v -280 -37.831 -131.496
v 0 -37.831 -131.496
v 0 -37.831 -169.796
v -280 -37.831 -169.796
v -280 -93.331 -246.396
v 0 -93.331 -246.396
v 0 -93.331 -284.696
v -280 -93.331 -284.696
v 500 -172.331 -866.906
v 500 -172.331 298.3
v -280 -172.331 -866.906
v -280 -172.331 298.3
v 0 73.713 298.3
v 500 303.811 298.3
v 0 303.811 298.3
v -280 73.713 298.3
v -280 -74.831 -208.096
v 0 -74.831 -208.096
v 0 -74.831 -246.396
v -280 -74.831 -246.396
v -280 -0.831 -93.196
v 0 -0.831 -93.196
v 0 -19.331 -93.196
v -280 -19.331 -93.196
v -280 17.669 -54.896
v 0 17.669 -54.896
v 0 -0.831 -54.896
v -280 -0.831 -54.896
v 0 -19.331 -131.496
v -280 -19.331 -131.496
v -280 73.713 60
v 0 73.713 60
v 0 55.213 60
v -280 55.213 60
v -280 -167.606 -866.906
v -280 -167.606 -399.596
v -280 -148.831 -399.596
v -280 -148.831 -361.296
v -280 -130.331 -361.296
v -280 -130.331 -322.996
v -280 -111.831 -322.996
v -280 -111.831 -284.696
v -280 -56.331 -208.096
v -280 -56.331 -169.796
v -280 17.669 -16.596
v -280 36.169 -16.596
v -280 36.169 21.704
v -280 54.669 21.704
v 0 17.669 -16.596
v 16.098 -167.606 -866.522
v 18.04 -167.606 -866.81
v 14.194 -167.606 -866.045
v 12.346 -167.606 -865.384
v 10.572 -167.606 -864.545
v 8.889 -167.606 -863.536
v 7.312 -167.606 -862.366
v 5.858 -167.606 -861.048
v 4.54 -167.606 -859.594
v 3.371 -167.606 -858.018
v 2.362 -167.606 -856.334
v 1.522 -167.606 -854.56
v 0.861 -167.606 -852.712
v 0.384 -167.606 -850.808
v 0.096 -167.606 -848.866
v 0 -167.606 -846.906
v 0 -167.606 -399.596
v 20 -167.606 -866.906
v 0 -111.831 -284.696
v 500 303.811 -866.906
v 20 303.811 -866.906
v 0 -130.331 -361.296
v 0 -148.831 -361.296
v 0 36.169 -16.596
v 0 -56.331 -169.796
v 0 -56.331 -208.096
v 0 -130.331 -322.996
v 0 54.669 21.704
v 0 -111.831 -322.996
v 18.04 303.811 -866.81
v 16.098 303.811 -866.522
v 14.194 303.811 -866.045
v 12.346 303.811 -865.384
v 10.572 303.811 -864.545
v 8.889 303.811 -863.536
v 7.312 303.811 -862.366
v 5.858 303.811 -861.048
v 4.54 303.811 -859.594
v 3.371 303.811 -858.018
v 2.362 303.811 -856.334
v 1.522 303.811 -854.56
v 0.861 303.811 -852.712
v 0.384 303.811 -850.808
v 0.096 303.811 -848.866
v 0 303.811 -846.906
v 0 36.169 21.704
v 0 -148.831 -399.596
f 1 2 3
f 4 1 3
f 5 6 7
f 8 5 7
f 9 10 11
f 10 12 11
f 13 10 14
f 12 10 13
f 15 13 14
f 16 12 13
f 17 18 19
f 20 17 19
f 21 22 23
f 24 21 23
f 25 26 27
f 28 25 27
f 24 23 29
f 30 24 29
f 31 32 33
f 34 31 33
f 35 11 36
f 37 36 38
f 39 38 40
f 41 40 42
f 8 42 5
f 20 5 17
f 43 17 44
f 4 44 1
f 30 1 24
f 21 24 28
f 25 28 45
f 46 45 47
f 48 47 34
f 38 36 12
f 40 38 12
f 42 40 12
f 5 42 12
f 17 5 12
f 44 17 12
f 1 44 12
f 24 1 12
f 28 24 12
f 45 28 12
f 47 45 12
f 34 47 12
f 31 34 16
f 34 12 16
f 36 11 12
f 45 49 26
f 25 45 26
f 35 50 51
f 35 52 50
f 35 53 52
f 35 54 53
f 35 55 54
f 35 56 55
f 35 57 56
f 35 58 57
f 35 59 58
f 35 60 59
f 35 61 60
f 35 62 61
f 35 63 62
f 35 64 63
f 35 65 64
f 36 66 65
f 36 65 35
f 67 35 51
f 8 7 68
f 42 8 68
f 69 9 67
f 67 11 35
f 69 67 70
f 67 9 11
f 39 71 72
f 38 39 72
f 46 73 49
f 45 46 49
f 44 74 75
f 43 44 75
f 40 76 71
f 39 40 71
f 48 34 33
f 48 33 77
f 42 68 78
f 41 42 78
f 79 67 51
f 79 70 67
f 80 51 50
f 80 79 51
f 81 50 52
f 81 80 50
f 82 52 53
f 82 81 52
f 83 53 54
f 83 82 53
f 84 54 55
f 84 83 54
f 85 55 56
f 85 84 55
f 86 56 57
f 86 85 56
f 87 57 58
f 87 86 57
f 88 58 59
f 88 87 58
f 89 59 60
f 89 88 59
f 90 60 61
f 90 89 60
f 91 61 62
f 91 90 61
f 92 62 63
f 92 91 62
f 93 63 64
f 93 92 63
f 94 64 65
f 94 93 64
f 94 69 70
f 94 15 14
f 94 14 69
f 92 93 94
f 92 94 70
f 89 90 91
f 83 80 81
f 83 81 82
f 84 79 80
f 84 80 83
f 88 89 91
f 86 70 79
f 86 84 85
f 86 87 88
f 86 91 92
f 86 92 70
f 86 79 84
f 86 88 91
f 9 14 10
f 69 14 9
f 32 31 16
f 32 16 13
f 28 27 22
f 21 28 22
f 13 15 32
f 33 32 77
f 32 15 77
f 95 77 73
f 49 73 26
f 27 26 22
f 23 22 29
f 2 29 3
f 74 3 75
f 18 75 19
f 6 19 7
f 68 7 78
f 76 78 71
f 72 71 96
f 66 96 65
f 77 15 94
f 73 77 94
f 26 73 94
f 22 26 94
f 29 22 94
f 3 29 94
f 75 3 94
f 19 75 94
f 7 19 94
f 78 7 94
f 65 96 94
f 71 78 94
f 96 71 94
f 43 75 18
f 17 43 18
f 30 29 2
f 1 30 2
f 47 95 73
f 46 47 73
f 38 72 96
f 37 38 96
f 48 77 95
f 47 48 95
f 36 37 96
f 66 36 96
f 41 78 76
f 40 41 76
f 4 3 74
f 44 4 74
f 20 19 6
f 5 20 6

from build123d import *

# Parameters (mm, degrees)
BOSS_EXTRUDE1_DEPTH = 280
SKETCH2_W           = 280
SKETCH2_H           = 5
BOSS_EXTRUDE2_DEPTH = 497.896133892
SKETCH3_W           = 280
SKETCH3_H           = 246.044177264
BOSS_EXTRUDE3_DEPTH = 200
SKETCH4_W           = 280
SKETCH4_H           = 4.725360331
BOSS_EXTRUDE4_DEPTH = 467.31
SKETCH5_W           = 1165.206133892
SKETCH5_H           = 476.142057012
BOSS_EXTRUDE5_DEPTH = 500
FILLET1_R           = 20


with BuildPart() as part:
    # Sketch1 → Boss-Extrude1 (new body)
    with BuildSketch(Plane(origin=(0, 0, 0), x_dir=(0, 0, -1), z_dir=(1, 0, 0))):
        Polygon((-98.3, 73.71314577), (-60, 73.71314577), (-60, 55.21314577), (-21.703866108, 54.668968506), (-21.703866108, 36.168968506), (16.596133892, 36.168968506), (16.596133892, 17.668968506), (54.896133892, 17.668968506), (54.896133892, -0.831031494), (93.196133892, -0.831031494), (93.196133892, -19.331031494), (131.496133892, -19.331031494), (131.496133892, -37.831031494), (169.796133892, -37.831031494), (169.796133892, -56.331031494), (208.096133892, -56.331031494), (208.096133892, -74.831031494), (246.396133892, -74.831031494), (246.396133892, -93.331031494), (284.696133892, -93.331031494), (284.696133892, -111.831031494), (322.996133892, -111.831031494), (322.996133892, -130.331031494), (361.296133892, -130.331031494), (361.296133892, -148.831031494), (399.596133892, -148.831031494), (399.596133892, -167.331031494), (-98.3, -167.331031494), align=None)
    extrude(amount=-BOSS_EXTRUDE1_DEPTH)

    # Sketch2 → Boss-Extrude2 (add)
    with BuildSketch(Plane.XY.offset(98.3)):
        with Locations((-140, -169.831031494)):
            Rectangle(SKETCH2_W, SKETCH2_H)
    extrude(amount=-BOSS_EXTRUDE2_DEPTH)

    # Sketch3 → Boss-Extrude3 (add)
    with BuildSketch(Plane.XY.offset(98.3)):
        with Locations((-140, -49.308942862)):
            Rectangle(SKETCH3_W, SKETCH3_H)
    extrude(amount=BOSS_EXTRUDE3_DEPTH)

    # Sketch4 → Boss-Extrude4 (add)
    with BuildSketch(Plane(origin=(0, 0, -399.596133892), x_dir=(-1, 0, 0), z_dir=(0, 0, -1))):
        with Locations((140, -169.968351329)):
            Rectangle(SKETCH4_W, SKETCH4_H)
    extrude(amount=BOSS_EXTRUDE4_DEPTH)

    # Sketch5 → Boss-Extrude5 (add)
    with BuildSketch(Plane(origin=(0, 0, 0), x_dir=(0, 0, -1), z_dir=(1, 0, 0))):
        with Locations((284.303066946, 65.739997012)):
            Rectangle(SKETCH5_W, SKETCH5_H)
    extrude(amount=BOSS_EXTRUDE5_DEPTH)

    # Fillet1
    fillet1_edges = [part.edges().sort_by_distance(p)[0] for p in [
        (0, 68.102677177, -866.906133892),
    ]]
    fillet(fillet1_edges, radius=FILLET1_R)


solid = part.part
